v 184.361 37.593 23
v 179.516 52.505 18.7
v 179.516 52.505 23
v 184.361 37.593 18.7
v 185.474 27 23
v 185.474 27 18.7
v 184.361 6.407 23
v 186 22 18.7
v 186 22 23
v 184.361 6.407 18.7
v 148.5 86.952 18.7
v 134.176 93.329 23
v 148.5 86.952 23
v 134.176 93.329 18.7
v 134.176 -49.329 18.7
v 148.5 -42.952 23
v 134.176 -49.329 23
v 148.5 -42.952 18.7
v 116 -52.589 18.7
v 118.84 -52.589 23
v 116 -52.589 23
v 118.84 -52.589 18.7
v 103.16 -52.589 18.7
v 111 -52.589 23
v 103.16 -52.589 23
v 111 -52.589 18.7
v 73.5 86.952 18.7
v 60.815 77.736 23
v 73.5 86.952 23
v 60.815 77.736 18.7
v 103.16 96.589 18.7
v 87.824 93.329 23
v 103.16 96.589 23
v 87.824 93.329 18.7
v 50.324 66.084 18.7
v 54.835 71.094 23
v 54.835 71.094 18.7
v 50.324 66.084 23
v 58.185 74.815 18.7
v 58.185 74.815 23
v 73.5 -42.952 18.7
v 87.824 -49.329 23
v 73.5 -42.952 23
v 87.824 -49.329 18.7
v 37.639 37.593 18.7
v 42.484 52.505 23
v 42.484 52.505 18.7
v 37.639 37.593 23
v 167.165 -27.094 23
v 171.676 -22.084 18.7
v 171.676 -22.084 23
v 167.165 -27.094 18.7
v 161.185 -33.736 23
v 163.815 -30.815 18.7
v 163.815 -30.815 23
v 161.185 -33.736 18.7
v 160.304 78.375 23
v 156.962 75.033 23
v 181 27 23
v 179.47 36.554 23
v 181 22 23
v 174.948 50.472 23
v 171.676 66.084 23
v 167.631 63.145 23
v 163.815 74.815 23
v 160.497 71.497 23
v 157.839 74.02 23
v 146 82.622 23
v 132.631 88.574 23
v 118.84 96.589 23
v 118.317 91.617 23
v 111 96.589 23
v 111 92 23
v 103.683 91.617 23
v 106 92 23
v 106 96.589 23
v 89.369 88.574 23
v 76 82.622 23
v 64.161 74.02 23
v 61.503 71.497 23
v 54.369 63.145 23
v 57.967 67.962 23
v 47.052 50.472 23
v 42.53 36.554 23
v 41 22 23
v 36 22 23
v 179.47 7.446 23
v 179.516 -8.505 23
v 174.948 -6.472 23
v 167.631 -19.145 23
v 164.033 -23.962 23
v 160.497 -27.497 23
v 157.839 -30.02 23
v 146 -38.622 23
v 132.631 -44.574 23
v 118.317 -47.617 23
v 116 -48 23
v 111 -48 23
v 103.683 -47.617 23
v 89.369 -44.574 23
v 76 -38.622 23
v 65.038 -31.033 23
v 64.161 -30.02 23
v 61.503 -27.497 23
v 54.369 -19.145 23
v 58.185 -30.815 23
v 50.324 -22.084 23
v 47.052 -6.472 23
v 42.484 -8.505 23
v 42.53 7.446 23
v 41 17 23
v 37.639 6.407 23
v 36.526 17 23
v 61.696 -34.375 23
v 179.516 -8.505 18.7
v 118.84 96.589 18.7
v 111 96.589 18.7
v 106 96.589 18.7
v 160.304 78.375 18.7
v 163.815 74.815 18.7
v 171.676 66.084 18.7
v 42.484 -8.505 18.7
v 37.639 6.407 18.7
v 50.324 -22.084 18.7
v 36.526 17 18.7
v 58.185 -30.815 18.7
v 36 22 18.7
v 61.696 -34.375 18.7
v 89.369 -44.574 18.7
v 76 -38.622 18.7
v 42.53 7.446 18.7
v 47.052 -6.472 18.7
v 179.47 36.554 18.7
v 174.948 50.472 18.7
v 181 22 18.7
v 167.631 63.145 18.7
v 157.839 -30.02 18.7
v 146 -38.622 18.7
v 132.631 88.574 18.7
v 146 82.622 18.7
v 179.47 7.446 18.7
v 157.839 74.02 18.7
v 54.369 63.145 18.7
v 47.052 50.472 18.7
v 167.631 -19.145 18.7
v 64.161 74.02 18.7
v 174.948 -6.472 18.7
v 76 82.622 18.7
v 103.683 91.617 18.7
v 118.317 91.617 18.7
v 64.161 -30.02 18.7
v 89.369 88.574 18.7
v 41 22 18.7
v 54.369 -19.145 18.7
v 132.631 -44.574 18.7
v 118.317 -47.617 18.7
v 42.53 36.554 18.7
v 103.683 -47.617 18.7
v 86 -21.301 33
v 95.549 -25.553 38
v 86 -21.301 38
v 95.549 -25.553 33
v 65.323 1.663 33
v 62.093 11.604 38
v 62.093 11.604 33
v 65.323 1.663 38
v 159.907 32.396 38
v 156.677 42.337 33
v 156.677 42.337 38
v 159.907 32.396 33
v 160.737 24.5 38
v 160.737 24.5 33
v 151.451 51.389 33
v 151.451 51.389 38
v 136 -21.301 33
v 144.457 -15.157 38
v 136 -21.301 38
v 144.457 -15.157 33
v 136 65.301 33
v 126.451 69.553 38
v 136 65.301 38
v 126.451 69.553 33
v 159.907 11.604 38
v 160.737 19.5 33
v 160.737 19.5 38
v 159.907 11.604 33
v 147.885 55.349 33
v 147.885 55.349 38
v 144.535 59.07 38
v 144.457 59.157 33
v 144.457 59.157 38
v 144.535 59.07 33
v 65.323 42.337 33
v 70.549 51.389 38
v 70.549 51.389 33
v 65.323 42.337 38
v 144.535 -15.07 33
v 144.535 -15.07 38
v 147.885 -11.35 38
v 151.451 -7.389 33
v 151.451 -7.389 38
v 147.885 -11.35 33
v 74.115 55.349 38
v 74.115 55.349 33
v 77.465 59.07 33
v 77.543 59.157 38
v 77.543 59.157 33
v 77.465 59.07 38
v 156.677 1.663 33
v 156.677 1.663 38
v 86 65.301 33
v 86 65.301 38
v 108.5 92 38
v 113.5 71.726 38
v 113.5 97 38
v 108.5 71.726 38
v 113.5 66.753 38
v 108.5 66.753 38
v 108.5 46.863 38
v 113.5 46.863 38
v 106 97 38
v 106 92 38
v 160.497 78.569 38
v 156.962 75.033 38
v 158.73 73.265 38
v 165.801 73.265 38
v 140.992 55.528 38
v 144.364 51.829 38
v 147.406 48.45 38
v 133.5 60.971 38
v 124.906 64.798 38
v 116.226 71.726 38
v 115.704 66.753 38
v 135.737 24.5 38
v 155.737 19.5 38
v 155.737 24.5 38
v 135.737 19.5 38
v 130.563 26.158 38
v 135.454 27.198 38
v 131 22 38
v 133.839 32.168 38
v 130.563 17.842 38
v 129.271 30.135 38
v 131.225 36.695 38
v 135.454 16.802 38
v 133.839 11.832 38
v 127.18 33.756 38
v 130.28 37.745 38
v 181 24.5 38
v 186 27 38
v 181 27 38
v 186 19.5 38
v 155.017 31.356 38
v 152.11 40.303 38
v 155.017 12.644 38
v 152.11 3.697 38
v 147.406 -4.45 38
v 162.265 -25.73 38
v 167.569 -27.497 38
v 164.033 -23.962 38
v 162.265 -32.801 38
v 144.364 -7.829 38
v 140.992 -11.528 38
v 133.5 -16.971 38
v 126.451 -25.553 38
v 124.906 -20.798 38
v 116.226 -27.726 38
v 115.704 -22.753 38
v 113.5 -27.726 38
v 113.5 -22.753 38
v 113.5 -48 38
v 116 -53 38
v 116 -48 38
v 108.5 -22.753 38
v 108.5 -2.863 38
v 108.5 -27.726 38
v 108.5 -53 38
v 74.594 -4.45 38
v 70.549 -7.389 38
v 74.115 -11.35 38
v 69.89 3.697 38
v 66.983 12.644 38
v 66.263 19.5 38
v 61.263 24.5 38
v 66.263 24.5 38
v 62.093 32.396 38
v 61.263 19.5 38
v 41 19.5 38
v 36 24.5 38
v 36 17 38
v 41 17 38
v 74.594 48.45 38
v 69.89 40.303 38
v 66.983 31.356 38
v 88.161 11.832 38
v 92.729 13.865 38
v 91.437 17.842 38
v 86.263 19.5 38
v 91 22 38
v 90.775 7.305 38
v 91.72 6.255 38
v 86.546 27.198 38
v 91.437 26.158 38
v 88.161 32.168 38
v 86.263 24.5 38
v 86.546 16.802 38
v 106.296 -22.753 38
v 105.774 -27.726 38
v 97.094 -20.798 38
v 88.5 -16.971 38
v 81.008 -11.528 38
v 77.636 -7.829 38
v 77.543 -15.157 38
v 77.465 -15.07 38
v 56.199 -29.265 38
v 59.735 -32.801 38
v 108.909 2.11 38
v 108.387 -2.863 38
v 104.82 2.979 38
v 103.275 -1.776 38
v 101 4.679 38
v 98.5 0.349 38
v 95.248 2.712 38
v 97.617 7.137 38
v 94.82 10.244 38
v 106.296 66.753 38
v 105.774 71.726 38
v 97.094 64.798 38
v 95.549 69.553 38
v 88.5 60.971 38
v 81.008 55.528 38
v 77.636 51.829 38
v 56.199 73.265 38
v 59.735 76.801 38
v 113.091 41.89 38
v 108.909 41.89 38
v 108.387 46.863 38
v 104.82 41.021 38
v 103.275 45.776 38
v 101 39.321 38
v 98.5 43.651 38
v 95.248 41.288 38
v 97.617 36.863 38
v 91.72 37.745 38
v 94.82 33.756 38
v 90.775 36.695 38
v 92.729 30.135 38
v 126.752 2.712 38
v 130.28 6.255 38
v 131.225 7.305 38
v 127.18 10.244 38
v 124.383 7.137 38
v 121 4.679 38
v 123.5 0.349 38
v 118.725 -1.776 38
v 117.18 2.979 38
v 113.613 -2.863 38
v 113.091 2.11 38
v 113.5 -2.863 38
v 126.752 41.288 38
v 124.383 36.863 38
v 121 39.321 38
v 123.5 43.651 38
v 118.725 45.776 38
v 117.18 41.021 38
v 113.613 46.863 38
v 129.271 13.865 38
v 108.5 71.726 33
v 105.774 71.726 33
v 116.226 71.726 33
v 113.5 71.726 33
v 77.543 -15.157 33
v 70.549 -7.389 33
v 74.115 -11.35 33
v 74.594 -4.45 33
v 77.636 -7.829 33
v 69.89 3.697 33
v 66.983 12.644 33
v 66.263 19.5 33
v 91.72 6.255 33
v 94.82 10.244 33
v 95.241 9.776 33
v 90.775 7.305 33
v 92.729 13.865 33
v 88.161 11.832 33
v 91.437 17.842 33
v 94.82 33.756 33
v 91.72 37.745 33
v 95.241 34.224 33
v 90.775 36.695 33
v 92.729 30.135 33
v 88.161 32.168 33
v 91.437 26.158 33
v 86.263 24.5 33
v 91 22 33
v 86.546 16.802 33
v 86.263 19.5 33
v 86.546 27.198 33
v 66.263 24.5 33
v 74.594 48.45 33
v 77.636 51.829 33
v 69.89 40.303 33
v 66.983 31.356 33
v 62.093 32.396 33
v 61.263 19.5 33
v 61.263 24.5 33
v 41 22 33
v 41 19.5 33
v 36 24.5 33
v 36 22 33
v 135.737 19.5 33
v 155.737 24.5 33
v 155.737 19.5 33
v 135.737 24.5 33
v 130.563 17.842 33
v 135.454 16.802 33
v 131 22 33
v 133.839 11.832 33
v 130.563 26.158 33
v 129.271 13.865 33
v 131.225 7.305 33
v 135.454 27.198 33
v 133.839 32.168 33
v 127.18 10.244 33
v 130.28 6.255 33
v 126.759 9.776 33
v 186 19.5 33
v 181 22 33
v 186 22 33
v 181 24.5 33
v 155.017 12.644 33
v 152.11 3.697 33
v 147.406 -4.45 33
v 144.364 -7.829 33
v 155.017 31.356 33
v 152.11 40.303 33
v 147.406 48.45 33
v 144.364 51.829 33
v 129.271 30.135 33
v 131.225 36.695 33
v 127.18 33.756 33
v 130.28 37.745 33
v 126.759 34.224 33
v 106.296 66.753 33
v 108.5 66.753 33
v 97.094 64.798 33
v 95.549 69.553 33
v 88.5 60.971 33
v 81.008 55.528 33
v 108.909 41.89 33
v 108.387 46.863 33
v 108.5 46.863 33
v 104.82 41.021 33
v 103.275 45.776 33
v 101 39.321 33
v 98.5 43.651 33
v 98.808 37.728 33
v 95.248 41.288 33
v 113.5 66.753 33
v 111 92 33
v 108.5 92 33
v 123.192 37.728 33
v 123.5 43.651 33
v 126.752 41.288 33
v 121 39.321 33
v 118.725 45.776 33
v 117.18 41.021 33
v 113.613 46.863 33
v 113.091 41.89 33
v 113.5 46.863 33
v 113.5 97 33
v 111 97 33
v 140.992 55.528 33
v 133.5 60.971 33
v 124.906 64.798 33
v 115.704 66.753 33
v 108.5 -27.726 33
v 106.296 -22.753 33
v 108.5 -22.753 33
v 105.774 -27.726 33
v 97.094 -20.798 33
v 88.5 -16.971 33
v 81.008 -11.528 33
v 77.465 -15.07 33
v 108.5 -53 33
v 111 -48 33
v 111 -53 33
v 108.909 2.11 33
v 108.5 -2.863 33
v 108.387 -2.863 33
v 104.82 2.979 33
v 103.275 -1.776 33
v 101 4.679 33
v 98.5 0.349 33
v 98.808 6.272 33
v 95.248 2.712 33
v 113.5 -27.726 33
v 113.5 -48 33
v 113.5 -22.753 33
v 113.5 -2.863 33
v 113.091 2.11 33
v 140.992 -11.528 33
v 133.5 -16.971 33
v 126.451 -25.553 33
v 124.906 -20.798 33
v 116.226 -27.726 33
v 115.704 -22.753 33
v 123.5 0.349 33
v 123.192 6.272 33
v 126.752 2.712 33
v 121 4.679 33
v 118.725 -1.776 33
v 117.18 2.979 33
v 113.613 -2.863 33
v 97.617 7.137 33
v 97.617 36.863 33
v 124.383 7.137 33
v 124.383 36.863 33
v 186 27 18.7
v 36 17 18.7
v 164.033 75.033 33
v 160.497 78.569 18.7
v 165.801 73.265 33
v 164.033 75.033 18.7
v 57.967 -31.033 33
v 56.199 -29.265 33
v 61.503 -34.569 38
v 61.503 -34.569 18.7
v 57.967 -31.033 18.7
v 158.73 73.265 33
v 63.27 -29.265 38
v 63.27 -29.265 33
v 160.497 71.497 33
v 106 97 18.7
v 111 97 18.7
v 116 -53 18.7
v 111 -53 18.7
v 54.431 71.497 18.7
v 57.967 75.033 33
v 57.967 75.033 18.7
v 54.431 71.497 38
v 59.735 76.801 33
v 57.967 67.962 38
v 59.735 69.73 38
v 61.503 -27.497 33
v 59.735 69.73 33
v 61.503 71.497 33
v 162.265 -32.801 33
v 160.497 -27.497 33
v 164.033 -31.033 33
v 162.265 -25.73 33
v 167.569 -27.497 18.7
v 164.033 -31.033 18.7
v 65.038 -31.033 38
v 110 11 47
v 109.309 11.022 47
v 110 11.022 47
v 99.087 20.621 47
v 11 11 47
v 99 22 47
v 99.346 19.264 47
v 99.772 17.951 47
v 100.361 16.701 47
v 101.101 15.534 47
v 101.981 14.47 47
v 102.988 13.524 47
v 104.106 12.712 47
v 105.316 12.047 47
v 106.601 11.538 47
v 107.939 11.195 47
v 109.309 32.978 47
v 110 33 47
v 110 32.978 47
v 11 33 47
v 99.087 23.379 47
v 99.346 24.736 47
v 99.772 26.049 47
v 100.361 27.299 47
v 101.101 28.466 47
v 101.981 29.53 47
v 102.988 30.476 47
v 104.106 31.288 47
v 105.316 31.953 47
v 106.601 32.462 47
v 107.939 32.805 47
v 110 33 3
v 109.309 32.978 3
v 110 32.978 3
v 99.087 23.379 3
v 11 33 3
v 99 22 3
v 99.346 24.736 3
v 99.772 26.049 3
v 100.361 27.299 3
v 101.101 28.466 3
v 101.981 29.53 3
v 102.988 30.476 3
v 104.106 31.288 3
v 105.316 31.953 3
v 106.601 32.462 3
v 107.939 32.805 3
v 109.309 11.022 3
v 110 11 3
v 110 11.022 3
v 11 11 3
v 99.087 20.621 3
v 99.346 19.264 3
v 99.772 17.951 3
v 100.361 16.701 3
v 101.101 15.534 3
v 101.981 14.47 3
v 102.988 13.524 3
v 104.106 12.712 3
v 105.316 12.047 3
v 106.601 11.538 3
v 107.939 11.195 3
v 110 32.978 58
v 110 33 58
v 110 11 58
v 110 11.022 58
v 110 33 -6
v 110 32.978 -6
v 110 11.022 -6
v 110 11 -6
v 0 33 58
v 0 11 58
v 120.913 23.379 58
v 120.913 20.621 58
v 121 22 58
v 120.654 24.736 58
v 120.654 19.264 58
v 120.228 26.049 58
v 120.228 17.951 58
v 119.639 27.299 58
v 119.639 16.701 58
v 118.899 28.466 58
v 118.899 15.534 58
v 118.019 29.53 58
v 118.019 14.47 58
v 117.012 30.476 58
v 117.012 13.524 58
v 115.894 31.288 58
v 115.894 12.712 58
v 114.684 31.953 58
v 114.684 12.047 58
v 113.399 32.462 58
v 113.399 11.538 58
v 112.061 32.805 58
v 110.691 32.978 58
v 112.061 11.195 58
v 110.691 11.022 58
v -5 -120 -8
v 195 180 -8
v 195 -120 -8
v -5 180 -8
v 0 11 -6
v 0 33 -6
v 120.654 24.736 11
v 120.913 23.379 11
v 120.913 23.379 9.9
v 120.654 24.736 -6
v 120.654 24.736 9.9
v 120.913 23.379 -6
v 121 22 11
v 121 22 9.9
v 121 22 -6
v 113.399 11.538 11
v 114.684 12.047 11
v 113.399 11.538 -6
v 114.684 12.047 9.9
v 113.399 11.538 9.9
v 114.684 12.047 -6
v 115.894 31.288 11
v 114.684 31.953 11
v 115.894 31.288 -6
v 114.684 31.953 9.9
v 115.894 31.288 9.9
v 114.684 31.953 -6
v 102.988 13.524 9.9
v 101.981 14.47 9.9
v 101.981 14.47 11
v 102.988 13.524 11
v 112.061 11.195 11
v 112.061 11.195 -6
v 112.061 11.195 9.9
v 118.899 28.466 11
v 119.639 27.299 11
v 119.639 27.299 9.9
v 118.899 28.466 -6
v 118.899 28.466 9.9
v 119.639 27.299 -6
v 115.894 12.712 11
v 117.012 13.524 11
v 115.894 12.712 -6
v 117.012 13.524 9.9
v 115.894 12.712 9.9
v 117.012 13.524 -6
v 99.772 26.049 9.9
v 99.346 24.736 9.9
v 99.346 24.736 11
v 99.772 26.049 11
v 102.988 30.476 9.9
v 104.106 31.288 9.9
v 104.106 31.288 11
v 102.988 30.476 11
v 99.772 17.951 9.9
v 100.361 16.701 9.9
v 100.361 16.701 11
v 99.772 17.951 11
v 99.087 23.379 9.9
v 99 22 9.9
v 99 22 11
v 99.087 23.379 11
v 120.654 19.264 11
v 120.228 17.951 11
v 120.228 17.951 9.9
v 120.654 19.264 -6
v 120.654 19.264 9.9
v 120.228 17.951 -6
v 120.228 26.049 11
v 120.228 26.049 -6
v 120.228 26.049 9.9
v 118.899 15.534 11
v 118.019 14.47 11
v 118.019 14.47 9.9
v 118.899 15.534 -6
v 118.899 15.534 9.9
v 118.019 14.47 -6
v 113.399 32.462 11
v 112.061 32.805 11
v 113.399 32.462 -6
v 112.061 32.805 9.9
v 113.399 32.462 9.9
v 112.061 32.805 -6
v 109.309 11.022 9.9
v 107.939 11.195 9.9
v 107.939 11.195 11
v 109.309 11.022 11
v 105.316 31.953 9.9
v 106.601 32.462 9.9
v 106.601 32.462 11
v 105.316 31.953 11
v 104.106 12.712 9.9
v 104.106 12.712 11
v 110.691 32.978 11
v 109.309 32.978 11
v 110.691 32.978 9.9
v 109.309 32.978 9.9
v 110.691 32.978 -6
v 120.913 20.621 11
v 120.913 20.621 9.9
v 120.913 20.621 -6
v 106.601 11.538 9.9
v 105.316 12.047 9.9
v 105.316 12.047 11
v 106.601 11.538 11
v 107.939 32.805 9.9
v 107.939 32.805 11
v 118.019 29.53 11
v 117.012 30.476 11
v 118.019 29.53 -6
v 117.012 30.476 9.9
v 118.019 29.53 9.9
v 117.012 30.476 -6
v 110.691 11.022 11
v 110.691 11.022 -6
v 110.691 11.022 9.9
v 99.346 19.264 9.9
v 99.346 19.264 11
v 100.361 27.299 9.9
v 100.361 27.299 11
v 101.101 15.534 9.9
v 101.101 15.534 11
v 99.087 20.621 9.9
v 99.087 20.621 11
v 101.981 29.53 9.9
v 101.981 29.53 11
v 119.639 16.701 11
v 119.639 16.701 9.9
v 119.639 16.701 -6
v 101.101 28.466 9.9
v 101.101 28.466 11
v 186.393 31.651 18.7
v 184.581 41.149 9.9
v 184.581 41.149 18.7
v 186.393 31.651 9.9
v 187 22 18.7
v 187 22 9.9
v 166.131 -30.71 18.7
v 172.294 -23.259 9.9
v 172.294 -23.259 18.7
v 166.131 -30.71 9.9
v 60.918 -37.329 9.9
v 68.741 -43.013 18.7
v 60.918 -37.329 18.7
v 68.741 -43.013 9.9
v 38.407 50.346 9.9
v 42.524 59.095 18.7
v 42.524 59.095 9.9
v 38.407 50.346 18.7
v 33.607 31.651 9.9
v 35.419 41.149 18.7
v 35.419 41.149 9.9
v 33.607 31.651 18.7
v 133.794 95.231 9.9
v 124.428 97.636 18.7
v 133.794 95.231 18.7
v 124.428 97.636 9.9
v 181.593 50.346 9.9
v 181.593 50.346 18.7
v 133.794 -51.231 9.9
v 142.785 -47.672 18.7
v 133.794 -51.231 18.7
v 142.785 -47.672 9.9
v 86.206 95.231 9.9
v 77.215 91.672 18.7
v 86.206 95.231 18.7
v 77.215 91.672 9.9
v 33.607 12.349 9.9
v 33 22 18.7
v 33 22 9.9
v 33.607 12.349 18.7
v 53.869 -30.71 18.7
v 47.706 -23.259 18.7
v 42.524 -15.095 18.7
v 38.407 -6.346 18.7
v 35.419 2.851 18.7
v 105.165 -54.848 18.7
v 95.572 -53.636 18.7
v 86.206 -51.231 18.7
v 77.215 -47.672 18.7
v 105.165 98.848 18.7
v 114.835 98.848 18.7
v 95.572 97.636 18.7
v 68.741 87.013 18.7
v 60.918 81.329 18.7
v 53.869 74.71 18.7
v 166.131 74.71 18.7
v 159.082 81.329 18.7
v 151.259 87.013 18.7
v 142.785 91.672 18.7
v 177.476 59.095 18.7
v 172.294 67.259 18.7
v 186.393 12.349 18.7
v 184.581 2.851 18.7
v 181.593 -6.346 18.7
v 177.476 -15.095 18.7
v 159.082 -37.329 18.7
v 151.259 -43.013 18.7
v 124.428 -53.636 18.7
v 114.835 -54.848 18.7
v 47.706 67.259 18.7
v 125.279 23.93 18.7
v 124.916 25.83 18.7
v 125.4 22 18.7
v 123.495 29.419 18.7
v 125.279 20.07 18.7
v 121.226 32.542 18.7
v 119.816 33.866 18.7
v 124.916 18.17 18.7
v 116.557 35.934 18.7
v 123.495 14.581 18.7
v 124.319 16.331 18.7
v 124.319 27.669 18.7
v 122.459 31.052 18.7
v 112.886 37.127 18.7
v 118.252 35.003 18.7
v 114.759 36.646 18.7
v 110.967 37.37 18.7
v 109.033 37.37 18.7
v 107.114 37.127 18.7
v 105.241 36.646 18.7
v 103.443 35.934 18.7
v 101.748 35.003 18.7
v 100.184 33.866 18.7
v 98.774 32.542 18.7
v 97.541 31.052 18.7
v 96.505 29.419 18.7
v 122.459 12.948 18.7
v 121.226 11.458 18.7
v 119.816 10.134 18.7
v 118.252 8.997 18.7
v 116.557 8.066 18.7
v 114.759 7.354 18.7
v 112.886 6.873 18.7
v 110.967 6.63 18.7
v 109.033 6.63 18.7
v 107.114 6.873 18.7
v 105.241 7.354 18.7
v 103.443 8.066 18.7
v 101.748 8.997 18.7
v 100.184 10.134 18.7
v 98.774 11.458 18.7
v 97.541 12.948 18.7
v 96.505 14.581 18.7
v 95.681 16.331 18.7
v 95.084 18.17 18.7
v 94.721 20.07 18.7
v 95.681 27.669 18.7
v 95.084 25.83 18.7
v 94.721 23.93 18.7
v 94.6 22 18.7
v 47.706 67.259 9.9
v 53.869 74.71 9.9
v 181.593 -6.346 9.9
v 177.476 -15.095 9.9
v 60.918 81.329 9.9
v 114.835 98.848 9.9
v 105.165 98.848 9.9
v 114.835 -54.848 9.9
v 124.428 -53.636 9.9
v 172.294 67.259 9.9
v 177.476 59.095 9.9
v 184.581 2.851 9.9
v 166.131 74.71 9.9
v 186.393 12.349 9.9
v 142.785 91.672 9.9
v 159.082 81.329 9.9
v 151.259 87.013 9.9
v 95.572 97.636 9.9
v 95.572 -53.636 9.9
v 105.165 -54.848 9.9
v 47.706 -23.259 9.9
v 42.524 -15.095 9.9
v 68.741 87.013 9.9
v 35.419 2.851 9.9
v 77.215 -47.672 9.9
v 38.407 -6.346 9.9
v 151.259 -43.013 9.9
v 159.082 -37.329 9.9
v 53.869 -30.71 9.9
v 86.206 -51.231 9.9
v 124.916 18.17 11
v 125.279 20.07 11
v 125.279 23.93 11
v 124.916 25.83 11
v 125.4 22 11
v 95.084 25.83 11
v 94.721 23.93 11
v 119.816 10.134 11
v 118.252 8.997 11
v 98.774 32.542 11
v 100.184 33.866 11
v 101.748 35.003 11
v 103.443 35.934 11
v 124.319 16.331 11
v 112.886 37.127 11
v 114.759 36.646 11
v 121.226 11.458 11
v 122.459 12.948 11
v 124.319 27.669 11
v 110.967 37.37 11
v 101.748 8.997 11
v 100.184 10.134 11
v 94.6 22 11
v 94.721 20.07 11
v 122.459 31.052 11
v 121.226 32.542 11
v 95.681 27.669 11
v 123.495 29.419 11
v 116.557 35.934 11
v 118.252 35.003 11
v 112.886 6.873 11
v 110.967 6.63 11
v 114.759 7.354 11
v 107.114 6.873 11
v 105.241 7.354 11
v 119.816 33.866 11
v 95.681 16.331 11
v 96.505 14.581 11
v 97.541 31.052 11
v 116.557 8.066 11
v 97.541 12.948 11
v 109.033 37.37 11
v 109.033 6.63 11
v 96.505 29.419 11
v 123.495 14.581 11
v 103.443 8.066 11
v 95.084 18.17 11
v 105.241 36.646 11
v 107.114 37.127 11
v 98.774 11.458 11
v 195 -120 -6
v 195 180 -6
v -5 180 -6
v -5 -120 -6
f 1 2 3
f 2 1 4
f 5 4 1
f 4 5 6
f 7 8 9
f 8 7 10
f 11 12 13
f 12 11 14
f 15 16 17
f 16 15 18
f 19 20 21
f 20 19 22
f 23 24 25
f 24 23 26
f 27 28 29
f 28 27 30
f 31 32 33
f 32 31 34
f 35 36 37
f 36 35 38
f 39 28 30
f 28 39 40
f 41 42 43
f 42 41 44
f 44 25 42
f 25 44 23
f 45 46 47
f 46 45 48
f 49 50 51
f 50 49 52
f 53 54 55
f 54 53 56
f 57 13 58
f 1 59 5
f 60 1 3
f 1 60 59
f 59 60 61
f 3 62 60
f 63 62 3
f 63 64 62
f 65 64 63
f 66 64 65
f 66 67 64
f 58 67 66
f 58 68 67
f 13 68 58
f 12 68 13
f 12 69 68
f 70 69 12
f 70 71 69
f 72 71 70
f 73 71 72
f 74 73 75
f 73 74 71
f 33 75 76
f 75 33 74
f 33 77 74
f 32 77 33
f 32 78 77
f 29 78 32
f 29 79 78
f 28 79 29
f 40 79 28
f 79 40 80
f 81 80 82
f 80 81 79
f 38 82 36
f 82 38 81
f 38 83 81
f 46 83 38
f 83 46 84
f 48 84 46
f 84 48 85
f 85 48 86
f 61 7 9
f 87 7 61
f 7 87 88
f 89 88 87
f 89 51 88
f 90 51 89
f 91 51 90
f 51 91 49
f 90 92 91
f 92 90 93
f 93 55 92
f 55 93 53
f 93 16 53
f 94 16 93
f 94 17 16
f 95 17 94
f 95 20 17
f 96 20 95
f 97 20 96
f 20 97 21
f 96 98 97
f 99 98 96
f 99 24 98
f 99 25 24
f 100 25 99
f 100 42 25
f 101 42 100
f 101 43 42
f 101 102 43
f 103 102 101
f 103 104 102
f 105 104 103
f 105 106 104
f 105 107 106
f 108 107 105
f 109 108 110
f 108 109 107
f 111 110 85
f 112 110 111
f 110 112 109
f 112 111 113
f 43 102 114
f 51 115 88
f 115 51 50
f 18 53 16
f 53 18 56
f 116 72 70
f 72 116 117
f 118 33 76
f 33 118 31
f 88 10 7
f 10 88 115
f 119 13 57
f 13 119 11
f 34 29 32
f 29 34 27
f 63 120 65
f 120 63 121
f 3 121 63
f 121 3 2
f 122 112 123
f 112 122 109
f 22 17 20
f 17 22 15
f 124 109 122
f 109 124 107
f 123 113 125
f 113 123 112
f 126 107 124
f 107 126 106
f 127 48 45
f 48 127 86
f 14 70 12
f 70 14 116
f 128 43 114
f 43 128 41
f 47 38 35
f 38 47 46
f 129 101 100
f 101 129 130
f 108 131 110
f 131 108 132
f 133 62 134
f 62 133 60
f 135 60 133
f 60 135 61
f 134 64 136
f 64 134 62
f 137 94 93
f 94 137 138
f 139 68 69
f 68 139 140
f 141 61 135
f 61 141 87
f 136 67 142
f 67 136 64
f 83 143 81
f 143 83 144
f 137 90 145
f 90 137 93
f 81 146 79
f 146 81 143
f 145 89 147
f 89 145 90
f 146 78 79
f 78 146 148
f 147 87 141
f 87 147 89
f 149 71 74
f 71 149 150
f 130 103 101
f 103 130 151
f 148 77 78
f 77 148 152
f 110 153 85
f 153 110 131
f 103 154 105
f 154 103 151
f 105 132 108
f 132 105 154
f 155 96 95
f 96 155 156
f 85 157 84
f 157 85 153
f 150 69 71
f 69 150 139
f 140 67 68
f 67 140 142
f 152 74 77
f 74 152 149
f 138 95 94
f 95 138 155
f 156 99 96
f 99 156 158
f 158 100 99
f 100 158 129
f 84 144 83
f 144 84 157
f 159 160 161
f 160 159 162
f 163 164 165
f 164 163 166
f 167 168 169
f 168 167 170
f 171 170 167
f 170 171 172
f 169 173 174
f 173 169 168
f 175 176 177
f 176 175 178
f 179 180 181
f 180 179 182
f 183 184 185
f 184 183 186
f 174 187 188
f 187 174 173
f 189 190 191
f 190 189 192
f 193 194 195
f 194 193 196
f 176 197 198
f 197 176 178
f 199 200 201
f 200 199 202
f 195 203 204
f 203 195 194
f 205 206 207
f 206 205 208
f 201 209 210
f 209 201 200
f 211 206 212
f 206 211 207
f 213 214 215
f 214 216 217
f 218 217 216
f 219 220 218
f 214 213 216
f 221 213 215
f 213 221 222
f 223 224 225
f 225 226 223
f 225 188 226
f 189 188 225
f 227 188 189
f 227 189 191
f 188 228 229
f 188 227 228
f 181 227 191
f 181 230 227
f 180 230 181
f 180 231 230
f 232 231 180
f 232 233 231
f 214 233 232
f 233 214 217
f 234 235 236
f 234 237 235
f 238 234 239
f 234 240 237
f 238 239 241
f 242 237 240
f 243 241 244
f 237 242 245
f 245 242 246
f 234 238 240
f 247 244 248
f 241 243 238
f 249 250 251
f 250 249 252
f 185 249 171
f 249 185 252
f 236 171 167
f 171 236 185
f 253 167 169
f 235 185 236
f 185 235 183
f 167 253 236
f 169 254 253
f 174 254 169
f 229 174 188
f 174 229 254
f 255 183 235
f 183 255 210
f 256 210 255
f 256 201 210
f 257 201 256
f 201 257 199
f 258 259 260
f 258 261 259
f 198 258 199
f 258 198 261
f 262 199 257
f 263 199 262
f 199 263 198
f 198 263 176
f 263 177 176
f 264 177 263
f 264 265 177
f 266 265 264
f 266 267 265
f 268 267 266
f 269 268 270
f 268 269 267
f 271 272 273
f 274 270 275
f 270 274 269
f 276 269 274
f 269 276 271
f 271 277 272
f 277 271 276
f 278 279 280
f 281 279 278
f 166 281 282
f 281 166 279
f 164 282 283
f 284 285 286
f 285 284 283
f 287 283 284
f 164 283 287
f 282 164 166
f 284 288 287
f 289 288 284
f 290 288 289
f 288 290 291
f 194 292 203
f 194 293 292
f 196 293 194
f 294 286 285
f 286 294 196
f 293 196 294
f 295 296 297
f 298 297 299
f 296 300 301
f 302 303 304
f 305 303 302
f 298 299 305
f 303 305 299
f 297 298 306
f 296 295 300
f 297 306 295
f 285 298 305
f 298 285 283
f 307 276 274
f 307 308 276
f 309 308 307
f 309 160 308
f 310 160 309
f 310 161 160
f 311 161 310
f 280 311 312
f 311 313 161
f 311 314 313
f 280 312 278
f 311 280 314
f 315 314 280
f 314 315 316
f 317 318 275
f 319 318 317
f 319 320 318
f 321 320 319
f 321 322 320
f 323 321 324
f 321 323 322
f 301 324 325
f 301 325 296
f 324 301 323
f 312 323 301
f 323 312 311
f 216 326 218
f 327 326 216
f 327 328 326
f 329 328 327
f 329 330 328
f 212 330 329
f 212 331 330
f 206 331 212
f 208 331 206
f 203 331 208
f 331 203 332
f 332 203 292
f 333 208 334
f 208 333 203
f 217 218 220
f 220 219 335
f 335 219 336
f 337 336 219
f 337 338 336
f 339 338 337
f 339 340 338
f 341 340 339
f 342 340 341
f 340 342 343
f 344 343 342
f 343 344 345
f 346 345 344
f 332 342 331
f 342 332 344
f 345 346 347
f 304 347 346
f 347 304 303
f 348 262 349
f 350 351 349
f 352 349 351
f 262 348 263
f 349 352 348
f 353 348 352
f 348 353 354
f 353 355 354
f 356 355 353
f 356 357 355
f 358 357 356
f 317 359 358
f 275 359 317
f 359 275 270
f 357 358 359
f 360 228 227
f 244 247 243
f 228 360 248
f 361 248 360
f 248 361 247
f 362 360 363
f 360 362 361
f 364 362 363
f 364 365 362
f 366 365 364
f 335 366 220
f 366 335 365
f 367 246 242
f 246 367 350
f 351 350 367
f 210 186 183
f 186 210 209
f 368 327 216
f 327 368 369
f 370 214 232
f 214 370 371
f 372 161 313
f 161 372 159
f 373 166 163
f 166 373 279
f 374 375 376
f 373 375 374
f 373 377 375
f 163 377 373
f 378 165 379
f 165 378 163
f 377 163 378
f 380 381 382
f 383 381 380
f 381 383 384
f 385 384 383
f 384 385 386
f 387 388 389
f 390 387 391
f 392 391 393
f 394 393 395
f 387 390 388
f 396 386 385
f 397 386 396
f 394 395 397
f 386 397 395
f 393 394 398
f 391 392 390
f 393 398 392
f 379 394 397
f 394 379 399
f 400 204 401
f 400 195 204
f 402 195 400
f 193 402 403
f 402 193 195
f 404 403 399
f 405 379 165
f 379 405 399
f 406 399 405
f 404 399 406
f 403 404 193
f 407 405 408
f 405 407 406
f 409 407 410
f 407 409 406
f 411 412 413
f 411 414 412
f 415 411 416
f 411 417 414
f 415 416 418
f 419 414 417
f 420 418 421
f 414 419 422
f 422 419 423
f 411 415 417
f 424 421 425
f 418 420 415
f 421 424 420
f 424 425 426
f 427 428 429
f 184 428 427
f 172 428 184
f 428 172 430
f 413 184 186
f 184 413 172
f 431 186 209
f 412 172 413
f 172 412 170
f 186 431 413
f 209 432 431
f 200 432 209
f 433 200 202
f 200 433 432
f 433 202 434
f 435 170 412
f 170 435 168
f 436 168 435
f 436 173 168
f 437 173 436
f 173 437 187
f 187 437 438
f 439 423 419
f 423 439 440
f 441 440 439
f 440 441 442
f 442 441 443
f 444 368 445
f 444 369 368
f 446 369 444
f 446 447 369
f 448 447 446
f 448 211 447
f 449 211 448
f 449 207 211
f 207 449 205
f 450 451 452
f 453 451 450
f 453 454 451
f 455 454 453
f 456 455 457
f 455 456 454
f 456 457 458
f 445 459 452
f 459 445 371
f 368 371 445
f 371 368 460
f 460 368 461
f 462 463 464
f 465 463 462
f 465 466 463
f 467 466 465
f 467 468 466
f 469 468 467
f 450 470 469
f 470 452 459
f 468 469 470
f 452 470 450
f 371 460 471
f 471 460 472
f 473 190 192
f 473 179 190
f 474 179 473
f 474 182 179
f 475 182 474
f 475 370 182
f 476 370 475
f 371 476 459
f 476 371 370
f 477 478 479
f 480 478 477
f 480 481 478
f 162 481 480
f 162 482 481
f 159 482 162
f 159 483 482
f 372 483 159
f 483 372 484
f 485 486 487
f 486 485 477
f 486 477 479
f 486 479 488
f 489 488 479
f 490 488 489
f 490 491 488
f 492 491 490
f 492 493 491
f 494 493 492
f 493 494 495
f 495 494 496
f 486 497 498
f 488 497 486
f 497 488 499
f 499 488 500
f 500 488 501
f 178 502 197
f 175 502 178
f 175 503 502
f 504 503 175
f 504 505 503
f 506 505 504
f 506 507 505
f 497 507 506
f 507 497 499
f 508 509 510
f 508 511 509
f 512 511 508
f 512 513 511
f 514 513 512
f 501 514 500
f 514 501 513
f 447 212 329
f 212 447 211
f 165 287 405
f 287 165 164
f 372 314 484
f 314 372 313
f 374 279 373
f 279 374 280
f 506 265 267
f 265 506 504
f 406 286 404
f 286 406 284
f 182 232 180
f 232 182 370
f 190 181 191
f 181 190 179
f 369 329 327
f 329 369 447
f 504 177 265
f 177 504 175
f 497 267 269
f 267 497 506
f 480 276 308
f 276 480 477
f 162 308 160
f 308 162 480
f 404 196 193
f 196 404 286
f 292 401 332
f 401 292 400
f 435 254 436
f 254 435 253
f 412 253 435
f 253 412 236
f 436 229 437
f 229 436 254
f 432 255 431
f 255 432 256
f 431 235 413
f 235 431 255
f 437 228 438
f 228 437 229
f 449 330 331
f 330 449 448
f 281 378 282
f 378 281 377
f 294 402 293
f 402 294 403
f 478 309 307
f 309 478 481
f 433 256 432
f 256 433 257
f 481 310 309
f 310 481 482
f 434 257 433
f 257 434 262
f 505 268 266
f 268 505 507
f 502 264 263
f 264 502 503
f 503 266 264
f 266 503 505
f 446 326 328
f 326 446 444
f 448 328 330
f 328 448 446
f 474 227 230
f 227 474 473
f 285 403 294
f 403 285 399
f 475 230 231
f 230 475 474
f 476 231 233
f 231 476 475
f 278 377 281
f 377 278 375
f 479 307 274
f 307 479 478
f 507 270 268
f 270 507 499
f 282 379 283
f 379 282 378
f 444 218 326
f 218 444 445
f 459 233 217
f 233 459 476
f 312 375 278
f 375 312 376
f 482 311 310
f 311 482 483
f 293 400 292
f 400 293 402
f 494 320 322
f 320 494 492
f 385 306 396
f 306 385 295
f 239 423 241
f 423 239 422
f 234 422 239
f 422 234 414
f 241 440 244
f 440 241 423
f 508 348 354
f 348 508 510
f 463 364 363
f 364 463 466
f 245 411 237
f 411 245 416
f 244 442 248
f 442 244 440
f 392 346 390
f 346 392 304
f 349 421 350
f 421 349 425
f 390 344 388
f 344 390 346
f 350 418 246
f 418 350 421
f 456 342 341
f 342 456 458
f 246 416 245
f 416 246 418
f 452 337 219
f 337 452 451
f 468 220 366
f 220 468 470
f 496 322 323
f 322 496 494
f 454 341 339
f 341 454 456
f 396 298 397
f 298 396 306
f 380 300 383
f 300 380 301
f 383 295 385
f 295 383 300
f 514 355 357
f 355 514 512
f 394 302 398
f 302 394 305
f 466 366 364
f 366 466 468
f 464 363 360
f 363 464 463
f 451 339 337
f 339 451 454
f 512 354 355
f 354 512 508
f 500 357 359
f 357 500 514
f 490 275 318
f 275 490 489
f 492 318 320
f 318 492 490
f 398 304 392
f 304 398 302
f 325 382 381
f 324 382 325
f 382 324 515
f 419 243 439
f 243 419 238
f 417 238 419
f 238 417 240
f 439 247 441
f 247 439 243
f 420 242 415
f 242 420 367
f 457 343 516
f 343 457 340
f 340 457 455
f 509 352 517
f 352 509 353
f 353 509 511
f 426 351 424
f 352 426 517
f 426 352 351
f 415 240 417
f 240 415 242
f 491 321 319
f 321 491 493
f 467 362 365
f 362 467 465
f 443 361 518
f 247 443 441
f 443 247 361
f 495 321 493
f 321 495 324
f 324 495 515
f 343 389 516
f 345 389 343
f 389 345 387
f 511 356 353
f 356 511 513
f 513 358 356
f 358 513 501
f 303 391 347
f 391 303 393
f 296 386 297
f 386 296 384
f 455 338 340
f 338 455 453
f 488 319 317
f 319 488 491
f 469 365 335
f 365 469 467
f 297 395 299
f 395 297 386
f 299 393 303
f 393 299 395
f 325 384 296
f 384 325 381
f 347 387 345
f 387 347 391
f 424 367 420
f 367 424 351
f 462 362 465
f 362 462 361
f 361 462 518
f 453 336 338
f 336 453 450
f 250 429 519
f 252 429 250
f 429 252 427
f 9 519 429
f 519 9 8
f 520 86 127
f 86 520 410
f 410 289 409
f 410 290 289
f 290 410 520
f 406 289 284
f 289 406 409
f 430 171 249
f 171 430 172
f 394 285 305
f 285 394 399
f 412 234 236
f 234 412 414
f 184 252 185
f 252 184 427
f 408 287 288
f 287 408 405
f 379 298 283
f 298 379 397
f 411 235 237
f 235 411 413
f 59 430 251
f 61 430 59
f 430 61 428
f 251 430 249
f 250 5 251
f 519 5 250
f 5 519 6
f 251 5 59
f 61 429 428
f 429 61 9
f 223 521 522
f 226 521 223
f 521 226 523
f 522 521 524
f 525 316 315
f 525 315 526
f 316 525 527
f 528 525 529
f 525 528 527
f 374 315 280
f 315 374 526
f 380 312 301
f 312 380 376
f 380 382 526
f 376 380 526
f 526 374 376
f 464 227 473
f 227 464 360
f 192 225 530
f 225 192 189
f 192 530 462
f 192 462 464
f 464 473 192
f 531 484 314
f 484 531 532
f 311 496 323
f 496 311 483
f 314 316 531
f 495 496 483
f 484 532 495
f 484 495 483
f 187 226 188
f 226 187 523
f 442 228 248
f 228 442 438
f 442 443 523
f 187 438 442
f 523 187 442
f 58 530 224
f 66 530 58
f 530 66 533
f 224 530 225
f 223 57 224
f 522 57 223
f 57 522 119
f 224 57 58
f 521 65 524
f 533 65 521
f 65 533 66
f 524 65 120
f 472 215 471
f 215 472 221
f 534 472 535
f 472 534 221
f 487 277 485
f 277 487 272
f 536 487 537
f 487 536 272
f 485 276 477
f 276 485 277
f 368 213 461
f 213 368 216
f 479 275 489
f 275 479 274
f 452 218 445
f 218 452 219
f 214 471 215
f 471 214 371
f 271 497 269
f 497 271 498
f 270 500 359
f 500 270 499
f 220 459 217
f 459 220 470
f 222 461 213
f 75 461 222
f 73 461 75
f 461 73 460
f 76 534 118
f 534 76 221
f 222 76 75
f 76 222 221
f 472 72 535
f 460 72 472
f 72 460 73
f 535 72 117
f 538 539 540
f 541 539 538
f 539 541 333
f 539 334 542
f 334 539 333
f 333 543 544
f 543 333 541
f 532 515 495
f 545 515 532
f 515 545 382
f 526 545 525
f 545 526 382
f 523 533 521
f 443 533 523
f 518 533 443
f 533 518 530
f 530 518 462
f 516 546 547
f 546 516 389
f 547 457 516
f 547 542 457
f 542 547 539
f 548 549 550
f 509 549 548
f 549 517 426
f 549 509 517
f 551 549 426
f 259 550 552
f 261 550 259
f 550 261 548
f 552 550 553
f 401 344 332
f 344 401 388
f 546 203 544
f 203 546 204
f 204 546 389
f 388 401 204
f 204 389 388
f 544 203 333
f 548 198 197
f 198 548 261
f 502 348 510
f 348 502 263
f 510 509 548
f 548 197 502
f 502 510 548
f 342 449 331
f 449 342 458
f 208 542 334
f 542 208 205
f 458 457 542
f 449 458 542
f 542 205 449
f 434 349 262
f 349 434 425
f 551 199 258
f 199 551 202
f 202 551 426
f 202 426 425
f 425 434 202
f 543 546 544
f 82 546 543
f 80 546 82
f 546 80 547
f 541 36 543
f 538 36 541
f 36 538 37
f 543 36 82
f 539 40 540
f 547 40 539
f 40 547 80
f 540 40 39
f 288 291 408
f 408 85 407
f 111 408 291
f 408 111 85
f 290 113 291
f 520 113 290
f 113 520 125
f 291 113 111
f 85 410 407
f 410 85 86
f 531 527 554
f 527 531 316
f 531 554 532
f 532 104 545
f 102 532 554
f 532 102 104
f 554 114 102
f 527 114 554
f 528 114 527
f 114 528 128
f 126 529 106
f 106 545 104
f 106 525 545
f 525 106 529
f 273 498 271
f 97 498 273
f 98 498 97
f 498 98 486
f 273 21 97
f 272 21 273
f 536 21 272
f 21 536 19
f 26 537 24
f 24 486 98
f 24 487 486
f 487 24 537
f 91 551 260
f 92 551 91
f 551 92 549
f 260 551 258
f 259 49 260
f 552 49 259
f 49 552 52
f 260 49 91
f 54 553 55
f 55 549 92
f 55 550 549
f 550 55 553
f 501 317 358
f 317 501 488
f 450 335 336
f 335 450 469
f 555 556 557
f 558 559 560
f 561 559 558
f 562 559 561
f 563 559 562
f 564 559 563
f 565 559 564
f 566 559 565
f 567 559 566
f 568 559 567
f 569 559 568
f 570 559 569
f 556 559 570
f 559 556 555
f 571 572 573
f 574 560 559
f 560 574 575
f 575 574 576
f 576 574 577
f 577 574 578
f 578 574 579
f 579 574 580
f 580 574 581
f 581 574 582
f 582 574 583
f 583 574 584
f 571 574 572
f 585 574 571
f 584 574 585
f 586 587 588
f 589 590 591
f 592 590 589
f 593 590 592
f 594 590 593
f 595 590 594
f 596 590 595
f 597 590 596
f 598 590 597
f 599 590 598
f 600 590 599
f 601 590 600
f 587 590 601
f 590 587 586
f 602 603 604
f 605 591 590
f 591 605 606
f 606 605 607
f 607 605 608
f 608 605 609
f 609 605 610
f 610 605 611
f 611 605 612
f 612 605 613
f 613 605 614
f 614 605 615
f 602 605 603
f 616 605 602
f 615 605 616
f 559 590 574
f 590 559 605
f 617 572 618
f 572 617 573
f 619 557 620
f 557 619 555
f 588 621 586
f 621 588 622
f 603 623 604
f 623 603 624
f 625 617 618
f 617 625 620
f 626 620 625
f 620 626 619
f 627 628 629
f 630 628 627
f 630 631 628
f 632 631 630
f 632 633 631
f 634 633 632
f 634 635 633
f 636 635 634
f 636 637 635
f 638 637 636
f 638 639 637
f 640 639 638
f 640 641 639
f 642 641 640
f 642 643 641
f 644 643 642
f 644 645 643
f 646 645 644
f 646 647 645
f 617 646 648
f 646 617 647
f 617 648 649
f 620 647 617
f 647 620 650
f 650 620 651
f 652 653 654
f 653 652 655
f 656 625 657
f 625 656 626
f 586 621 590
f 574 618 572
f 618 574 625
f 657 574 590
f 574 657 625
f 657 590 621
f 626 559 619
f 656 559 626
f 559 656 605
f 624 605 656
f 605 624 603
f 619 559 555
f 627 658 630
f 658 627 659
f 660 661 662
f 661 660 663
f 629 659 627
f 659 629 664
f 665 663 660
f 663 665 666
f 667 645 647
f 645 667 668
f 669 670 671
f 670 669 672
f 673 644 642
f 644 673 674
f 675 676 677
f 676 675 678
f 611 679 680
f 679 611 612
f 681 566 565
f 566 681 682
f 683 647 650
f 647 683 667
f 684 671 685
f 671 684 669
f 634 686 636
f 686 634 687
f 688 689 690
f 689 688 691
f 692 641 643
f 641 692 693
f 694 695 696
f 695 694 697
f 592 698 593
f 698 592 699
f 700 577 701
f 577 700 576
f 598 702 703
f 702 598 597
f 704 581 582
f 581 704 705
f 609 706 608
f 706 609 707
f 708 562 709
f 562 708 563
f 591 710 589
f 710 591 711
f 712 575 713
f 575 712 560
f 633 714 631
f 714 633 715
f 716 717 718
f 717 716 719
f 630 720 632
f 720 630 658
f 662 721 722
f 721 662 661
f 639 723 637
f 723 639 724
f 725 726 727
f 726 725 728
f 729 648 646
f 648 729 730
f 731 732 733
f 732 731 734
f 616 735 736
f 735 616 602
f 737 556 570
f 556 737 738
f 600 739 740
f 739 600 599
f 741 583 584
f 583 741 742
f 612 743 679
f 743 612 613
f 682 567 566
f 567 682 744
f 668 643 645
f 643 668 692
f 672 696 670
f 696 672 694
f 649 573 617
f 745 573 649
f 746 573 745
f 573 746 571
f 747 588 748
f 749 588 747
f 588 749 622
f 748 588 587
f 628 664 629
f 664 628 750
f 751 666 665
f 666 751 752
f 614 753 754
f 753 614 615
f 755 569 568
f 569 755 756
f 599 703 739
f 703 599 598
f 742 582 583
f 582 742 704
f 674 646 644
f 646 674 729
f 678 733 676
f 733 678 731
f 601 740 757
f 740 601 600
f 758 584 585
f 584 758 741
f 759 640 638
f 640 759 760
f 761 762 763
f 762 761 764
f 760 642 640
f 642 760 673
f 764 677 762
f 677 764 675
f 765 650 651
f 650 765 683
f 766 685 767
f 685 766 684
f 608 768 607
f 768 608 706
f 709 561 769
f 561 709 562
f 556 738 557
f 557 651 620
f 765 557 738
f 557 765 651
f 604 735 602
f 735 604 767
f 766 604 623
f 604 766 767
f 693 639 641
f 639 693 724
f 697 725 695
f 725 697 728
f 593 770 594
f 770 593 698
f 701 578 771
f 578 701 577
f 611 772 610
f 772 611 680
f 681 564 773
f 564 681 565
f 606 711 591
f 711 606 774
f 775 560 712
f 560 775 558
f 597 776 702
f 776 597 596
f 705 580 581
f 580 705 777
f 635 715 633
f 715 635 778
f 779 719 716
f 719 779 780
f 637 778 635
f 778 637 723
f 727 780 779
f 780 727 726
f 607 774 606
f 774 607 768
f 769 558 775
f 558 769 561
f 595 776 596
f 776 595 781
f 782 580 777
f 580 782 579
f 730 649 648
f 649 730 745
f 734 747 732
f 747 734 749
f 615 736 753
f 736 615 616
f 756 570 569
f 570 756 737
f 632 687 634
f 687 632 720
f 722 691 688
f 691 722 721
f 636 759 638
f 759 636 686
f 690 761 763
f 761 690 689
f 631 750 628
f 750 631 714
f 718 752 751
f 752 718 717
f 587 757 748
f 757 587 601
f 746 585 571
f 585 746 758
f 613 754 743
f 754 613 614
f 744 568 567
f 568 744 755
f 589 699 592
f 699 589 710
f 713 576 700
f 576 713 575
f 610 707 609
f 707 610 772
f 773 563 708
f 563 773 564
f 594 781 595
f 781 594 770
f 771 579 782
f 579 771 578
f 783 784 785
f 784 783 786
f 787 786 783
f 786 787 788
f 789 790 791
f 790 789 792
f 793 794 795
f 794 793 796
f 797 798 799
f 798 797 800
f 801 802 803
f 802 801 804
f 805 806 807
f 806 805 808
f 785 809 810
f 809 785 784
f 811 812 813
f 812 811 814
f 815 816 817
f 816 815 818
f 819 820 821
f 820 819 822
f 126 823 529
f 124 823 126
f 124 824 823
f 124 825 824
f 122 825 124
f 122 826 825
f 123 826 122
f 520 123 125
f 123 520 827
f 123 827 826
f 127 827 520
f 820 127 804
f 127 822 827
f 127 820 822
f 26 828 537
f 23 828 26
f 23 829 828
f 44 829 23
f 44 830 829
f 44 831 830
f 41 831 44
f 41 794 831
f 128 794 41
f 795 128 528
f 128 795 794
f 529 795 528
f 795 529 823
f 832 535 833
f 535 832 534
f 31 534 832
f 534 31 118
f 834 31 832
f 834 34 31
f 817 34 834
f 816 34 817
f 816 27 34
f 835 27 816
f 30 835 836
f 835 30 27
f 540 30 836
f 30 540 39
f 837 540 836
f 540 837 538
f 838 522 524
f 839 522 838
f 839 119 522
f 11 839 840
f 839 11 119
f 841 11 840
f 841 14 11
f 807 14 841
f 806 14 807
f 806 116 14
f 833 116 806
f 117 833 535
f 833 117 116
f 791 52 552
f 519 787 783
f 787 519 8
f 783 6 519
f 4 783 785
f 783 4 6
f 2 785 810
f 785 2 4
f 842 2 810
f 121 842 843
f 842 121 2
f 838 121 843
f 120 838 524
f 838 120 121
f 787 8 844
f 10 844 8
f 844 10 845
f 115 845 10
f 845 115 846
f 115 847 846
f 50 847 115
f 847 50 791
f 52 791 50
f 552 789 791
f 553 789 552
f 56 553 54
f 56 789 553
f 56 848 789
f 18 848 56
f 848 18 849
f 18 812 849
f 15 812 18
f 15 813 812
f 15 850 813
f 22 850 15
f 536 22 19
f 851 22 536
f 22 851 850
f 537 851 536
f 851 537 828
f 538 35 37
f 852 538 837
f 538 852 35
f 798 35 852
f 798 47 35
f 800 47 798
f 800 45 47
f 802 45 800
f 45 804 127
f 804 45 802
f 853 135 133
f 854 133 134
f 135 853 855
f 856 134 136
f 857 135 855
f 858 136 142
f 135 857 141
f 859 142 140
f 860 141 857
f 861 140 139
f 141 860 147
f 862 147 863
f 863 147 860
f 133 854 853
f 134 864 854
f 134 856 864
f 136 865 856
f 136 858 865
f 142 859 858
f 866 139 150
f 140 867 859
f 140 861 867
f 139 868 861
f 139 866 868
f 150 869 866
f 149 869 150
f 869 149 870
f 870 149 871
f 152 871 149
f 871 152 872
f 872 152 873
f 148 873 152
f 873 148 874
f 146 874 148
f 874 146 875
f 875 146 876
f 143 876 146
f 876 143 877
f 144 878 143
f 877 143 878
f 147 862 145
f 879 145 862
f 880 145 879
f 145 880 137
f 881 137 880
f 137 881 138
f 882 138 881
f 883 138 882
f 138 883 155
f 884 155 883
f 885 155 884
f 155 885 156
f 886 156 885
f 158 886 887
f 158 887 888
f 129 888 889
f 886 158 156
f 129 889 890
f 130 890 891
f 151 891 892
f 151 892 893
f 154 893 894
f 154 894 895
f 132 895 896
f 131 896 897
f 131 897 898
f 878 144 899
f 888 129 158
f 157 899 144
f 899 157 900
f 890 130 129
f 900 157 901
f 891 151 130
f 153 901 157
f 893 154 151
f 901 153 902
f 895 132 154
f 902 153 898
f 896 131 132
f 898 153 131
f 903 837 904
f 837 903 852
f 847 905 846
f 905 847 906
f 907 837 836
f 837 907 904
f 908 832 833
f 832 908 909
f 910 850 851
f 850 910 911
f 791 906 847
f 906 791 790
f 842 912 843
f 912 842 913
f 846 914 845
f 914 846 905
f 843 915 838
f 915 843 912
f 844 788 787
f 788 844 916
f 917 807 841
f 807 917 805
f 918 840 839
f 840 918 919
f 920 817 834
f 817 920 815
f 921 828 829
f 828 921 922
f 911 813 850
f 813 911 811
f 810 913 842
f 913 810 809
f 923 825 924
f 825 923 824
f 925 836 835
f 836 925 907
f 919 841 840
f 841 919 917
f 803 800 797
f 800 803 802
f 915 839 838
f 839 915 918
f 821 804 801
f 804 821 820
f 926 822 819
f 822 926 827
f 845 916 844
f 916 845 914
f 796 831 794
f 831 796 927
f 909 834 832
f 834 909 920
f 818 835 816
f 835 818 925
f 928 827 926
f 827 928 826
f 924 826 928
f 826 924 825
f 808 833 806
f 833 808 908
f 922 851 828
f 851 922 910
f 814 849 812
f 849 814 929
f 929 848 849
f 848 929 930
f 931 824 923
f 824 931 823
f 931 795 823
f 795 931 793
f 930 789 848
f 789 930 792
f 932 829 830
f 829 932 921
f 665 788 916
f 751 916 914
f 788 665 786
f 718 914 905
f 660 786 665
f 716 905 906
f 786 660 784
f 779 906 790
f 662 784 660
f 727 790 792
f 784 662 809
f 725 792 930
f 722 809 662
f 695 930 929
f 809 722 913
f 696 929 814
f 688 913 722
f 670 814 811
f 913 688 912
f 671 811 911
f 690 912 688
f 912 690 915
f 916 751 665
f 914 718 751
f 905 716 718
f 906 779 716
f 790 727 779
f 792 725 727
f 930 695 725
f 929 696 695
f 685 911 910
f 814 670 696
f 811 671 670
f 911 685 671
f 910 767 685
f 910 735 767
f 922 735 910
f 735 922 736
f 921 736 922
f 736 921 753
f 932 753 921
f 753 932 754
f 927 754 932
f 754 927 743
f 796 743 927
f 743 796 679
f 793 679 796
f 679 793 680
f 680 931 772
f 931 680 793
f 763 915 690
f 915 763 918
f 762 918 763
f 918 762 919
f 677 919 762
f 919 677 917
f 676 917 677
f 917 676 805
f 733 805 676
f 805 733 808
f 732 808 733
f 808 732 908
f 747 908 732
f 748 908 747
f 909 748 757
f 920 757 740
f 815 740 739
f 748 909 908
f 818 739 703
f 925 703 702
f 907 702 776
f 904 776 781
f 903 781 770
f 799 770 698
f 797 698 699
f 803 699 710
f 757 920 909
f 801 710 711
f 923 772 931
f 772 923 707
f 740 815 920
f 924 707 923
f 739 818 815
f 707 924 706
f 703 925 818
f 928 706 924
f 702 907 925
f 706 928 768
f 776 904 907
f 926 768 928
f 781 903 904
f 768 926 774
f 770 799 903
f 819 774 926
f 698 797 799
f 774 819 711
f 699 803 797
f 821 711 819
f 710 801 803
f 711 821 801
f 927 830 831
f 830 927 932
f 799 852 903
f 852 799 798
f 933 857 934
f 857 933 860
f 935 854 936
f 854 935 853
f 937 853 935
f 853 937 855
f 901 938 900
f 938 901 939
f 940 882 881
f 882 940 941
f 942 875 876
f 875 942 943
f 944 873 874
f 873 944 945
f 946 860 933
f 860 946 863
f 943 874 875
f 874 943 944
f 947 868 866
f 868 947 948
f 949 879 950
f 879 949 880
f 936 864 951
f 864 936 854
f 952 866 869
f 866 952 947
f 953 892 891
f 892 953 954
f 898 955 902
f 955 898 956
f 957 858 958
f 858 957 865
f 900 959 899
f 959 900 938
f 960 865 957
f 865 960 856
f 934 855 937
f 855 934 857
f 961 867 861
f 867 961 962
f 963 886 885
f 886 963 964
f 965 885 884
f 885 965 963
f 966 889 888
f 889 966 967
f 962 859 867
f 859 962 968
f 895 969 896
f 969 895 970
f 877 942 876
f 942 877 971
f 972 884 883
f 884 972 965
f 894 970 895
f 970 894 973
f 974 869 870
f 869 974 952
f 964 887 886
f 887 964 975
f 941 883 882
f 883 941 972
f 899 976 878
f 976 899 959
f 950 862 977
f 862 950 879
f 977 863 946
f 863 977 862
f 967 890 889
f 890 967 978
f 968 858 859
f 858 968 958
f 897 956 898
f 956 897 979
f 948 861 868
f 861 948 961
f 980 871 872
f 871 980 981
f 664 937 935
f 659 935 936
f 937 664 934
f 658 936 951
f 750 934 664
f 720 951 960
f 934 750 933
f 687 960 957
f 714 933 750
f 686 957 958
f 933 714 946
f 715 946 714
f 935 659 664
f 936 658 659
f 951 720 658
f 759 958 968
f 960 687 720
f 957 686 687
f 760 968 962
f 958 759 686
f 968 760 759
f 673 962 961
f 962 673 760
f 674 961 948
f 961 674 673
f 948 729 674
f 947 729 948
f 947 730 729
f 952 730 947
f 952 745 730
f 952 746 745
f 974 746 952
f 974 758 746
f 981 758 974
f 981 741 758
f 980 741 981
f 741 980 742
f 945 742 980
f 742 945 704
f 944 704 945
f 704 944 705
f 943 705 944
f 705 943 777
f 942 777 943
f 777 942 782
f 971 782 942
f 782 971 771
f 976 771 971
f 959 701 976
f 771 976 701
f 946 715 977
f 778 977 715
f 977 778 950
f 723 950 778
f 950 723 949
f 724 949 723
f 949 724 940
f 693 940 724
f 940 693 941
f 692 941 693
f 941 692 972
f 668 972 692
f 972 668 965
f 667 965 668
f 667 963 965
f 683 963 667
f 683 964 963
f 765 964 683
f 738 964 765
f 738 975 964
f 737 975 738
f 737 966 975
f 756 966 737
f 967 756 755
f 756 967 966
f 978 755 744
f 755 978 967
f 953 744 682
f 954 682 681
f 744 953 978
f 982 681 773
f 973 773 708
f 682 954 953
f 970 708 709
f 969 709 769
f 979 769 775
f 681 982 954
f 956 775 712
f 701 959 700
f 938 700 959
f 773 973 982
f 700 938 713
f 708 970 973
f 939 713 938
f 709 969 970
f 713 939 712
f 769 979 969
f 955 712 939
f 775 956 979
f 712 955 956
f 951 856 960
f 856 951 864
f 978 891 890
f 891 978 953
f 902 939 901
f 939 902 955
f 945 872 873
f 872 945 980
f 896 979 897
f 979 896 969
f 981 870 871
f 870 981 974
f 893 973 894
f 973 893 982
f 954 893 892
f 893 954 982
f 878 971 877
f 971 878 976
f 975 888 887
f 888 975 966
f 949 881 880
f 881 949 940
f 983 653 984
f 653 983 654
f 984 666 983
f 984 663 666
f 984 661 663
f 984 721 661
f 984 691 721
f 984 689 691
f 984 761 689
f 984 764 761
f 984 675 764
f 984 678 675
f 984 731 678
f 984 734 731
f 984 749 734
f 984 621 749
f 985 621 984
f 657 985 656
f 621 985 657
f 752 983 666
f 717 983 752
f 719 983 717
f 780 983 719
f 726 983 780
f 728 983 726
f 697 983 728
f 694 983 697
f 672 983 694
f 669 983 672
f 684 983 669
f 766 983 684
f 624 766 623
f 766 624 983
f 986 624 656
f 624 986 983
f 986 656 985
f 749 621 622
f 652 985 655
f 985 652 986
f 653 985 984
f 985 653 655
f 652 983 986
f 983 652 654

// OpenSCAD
// file: wheel-v2.scad
module inner(){
 	translate([-.5,0,0])
 		cube([8,8,2]);
 	cube([9,7,2]);
 }
 
 module box(){

	translate([0,0.5,0])
 	difference(){
 		cube([5,1,3]);
 
 		translate([1,-0.5,0.5])
 			inner();
 	}
 	
 	translate([5,1,0])
 		cylinder(r=0.5, h=3, $fn=50);
 }
 
 module roller(){
 	difference(){
 		color("red")
 			translate([5,1,0.9])
 			cylinder(r=3.5, h=0.8, $fn=50);
 
 		translate([5,1,1])
 			cylinder(r=0.7, h=3, $fn=50);
 	}
 }
 
 module vex(){
 	translate([5, 1, 1.5])
 		for( i = [0:5] ){
 
 			rotate(i*360/6, [0,0,1])
 			translate([0, 3, 0])
 			cylinder(r=0.4, h=0.5, $fn=50);
 	}
 }
 
 box();
 roller();
 //vex();
// main file
use <wheel-v2.scad>;

module wheel(factor){

	translate([0,0,-8]) scale([factor*2, factor*2, factor*2])
		box();
	scale([factor*2, factor*2, factor])	
		roller();

}

module frame(factor){
	//http://www.thingiverse.com/thing:95869
	difference() {
		scale([factor, factor, factor])
		//import("component/FerrisWheel.stl");
		import("component/ferris.stl");
		translate([-110, -44, -30]) rotate([0,0,2])
			cube([200, 40, 200]);
	}
}

module ferris(factor){

	//outer frame
	difference(){
		cylinder(r=30*factor, h=2*factor);

		translate([0,0,-1])
			cylinder(r=28*factor, h=4*factor);
	}

	translate([0, 0, 6*factor]) difference(){
		cylinder(r=20*factor, h=2*factor);

		translate([0,0,-1])
			cylinder(r=18*factor, h=4*factor);
	}

	//inner frame
	translate([0, 0, 6*factor]) difference(){
		cylinder(r=10*factor, h=2*factor);

		translate([0,0,-1])
			cylinder(r=8*factor, h=4*factor);
	}

	for(i=[0 : 8])
	rotate(i*360/8, [0,0,1]){
		translate([0,0, 7*factor]) cube([60*factor, 2*factor, 2*factor], center=true);
		translate([28*factor, 0, 0]) cube([2*factor,2*factor,8*factor]);
	}

}

translate([111, 22, 18])
difference(){
	ferris(2.5);

	//hole in the middle
	cylinder(r=20, h=42, center=true);
}



//base
translate([-5, -120, -8])
	cube([200, 300, 2]);

wheel(11);

//translate([30, 85, 37]) rotate([180, 0, 0])
//	frame(1);
